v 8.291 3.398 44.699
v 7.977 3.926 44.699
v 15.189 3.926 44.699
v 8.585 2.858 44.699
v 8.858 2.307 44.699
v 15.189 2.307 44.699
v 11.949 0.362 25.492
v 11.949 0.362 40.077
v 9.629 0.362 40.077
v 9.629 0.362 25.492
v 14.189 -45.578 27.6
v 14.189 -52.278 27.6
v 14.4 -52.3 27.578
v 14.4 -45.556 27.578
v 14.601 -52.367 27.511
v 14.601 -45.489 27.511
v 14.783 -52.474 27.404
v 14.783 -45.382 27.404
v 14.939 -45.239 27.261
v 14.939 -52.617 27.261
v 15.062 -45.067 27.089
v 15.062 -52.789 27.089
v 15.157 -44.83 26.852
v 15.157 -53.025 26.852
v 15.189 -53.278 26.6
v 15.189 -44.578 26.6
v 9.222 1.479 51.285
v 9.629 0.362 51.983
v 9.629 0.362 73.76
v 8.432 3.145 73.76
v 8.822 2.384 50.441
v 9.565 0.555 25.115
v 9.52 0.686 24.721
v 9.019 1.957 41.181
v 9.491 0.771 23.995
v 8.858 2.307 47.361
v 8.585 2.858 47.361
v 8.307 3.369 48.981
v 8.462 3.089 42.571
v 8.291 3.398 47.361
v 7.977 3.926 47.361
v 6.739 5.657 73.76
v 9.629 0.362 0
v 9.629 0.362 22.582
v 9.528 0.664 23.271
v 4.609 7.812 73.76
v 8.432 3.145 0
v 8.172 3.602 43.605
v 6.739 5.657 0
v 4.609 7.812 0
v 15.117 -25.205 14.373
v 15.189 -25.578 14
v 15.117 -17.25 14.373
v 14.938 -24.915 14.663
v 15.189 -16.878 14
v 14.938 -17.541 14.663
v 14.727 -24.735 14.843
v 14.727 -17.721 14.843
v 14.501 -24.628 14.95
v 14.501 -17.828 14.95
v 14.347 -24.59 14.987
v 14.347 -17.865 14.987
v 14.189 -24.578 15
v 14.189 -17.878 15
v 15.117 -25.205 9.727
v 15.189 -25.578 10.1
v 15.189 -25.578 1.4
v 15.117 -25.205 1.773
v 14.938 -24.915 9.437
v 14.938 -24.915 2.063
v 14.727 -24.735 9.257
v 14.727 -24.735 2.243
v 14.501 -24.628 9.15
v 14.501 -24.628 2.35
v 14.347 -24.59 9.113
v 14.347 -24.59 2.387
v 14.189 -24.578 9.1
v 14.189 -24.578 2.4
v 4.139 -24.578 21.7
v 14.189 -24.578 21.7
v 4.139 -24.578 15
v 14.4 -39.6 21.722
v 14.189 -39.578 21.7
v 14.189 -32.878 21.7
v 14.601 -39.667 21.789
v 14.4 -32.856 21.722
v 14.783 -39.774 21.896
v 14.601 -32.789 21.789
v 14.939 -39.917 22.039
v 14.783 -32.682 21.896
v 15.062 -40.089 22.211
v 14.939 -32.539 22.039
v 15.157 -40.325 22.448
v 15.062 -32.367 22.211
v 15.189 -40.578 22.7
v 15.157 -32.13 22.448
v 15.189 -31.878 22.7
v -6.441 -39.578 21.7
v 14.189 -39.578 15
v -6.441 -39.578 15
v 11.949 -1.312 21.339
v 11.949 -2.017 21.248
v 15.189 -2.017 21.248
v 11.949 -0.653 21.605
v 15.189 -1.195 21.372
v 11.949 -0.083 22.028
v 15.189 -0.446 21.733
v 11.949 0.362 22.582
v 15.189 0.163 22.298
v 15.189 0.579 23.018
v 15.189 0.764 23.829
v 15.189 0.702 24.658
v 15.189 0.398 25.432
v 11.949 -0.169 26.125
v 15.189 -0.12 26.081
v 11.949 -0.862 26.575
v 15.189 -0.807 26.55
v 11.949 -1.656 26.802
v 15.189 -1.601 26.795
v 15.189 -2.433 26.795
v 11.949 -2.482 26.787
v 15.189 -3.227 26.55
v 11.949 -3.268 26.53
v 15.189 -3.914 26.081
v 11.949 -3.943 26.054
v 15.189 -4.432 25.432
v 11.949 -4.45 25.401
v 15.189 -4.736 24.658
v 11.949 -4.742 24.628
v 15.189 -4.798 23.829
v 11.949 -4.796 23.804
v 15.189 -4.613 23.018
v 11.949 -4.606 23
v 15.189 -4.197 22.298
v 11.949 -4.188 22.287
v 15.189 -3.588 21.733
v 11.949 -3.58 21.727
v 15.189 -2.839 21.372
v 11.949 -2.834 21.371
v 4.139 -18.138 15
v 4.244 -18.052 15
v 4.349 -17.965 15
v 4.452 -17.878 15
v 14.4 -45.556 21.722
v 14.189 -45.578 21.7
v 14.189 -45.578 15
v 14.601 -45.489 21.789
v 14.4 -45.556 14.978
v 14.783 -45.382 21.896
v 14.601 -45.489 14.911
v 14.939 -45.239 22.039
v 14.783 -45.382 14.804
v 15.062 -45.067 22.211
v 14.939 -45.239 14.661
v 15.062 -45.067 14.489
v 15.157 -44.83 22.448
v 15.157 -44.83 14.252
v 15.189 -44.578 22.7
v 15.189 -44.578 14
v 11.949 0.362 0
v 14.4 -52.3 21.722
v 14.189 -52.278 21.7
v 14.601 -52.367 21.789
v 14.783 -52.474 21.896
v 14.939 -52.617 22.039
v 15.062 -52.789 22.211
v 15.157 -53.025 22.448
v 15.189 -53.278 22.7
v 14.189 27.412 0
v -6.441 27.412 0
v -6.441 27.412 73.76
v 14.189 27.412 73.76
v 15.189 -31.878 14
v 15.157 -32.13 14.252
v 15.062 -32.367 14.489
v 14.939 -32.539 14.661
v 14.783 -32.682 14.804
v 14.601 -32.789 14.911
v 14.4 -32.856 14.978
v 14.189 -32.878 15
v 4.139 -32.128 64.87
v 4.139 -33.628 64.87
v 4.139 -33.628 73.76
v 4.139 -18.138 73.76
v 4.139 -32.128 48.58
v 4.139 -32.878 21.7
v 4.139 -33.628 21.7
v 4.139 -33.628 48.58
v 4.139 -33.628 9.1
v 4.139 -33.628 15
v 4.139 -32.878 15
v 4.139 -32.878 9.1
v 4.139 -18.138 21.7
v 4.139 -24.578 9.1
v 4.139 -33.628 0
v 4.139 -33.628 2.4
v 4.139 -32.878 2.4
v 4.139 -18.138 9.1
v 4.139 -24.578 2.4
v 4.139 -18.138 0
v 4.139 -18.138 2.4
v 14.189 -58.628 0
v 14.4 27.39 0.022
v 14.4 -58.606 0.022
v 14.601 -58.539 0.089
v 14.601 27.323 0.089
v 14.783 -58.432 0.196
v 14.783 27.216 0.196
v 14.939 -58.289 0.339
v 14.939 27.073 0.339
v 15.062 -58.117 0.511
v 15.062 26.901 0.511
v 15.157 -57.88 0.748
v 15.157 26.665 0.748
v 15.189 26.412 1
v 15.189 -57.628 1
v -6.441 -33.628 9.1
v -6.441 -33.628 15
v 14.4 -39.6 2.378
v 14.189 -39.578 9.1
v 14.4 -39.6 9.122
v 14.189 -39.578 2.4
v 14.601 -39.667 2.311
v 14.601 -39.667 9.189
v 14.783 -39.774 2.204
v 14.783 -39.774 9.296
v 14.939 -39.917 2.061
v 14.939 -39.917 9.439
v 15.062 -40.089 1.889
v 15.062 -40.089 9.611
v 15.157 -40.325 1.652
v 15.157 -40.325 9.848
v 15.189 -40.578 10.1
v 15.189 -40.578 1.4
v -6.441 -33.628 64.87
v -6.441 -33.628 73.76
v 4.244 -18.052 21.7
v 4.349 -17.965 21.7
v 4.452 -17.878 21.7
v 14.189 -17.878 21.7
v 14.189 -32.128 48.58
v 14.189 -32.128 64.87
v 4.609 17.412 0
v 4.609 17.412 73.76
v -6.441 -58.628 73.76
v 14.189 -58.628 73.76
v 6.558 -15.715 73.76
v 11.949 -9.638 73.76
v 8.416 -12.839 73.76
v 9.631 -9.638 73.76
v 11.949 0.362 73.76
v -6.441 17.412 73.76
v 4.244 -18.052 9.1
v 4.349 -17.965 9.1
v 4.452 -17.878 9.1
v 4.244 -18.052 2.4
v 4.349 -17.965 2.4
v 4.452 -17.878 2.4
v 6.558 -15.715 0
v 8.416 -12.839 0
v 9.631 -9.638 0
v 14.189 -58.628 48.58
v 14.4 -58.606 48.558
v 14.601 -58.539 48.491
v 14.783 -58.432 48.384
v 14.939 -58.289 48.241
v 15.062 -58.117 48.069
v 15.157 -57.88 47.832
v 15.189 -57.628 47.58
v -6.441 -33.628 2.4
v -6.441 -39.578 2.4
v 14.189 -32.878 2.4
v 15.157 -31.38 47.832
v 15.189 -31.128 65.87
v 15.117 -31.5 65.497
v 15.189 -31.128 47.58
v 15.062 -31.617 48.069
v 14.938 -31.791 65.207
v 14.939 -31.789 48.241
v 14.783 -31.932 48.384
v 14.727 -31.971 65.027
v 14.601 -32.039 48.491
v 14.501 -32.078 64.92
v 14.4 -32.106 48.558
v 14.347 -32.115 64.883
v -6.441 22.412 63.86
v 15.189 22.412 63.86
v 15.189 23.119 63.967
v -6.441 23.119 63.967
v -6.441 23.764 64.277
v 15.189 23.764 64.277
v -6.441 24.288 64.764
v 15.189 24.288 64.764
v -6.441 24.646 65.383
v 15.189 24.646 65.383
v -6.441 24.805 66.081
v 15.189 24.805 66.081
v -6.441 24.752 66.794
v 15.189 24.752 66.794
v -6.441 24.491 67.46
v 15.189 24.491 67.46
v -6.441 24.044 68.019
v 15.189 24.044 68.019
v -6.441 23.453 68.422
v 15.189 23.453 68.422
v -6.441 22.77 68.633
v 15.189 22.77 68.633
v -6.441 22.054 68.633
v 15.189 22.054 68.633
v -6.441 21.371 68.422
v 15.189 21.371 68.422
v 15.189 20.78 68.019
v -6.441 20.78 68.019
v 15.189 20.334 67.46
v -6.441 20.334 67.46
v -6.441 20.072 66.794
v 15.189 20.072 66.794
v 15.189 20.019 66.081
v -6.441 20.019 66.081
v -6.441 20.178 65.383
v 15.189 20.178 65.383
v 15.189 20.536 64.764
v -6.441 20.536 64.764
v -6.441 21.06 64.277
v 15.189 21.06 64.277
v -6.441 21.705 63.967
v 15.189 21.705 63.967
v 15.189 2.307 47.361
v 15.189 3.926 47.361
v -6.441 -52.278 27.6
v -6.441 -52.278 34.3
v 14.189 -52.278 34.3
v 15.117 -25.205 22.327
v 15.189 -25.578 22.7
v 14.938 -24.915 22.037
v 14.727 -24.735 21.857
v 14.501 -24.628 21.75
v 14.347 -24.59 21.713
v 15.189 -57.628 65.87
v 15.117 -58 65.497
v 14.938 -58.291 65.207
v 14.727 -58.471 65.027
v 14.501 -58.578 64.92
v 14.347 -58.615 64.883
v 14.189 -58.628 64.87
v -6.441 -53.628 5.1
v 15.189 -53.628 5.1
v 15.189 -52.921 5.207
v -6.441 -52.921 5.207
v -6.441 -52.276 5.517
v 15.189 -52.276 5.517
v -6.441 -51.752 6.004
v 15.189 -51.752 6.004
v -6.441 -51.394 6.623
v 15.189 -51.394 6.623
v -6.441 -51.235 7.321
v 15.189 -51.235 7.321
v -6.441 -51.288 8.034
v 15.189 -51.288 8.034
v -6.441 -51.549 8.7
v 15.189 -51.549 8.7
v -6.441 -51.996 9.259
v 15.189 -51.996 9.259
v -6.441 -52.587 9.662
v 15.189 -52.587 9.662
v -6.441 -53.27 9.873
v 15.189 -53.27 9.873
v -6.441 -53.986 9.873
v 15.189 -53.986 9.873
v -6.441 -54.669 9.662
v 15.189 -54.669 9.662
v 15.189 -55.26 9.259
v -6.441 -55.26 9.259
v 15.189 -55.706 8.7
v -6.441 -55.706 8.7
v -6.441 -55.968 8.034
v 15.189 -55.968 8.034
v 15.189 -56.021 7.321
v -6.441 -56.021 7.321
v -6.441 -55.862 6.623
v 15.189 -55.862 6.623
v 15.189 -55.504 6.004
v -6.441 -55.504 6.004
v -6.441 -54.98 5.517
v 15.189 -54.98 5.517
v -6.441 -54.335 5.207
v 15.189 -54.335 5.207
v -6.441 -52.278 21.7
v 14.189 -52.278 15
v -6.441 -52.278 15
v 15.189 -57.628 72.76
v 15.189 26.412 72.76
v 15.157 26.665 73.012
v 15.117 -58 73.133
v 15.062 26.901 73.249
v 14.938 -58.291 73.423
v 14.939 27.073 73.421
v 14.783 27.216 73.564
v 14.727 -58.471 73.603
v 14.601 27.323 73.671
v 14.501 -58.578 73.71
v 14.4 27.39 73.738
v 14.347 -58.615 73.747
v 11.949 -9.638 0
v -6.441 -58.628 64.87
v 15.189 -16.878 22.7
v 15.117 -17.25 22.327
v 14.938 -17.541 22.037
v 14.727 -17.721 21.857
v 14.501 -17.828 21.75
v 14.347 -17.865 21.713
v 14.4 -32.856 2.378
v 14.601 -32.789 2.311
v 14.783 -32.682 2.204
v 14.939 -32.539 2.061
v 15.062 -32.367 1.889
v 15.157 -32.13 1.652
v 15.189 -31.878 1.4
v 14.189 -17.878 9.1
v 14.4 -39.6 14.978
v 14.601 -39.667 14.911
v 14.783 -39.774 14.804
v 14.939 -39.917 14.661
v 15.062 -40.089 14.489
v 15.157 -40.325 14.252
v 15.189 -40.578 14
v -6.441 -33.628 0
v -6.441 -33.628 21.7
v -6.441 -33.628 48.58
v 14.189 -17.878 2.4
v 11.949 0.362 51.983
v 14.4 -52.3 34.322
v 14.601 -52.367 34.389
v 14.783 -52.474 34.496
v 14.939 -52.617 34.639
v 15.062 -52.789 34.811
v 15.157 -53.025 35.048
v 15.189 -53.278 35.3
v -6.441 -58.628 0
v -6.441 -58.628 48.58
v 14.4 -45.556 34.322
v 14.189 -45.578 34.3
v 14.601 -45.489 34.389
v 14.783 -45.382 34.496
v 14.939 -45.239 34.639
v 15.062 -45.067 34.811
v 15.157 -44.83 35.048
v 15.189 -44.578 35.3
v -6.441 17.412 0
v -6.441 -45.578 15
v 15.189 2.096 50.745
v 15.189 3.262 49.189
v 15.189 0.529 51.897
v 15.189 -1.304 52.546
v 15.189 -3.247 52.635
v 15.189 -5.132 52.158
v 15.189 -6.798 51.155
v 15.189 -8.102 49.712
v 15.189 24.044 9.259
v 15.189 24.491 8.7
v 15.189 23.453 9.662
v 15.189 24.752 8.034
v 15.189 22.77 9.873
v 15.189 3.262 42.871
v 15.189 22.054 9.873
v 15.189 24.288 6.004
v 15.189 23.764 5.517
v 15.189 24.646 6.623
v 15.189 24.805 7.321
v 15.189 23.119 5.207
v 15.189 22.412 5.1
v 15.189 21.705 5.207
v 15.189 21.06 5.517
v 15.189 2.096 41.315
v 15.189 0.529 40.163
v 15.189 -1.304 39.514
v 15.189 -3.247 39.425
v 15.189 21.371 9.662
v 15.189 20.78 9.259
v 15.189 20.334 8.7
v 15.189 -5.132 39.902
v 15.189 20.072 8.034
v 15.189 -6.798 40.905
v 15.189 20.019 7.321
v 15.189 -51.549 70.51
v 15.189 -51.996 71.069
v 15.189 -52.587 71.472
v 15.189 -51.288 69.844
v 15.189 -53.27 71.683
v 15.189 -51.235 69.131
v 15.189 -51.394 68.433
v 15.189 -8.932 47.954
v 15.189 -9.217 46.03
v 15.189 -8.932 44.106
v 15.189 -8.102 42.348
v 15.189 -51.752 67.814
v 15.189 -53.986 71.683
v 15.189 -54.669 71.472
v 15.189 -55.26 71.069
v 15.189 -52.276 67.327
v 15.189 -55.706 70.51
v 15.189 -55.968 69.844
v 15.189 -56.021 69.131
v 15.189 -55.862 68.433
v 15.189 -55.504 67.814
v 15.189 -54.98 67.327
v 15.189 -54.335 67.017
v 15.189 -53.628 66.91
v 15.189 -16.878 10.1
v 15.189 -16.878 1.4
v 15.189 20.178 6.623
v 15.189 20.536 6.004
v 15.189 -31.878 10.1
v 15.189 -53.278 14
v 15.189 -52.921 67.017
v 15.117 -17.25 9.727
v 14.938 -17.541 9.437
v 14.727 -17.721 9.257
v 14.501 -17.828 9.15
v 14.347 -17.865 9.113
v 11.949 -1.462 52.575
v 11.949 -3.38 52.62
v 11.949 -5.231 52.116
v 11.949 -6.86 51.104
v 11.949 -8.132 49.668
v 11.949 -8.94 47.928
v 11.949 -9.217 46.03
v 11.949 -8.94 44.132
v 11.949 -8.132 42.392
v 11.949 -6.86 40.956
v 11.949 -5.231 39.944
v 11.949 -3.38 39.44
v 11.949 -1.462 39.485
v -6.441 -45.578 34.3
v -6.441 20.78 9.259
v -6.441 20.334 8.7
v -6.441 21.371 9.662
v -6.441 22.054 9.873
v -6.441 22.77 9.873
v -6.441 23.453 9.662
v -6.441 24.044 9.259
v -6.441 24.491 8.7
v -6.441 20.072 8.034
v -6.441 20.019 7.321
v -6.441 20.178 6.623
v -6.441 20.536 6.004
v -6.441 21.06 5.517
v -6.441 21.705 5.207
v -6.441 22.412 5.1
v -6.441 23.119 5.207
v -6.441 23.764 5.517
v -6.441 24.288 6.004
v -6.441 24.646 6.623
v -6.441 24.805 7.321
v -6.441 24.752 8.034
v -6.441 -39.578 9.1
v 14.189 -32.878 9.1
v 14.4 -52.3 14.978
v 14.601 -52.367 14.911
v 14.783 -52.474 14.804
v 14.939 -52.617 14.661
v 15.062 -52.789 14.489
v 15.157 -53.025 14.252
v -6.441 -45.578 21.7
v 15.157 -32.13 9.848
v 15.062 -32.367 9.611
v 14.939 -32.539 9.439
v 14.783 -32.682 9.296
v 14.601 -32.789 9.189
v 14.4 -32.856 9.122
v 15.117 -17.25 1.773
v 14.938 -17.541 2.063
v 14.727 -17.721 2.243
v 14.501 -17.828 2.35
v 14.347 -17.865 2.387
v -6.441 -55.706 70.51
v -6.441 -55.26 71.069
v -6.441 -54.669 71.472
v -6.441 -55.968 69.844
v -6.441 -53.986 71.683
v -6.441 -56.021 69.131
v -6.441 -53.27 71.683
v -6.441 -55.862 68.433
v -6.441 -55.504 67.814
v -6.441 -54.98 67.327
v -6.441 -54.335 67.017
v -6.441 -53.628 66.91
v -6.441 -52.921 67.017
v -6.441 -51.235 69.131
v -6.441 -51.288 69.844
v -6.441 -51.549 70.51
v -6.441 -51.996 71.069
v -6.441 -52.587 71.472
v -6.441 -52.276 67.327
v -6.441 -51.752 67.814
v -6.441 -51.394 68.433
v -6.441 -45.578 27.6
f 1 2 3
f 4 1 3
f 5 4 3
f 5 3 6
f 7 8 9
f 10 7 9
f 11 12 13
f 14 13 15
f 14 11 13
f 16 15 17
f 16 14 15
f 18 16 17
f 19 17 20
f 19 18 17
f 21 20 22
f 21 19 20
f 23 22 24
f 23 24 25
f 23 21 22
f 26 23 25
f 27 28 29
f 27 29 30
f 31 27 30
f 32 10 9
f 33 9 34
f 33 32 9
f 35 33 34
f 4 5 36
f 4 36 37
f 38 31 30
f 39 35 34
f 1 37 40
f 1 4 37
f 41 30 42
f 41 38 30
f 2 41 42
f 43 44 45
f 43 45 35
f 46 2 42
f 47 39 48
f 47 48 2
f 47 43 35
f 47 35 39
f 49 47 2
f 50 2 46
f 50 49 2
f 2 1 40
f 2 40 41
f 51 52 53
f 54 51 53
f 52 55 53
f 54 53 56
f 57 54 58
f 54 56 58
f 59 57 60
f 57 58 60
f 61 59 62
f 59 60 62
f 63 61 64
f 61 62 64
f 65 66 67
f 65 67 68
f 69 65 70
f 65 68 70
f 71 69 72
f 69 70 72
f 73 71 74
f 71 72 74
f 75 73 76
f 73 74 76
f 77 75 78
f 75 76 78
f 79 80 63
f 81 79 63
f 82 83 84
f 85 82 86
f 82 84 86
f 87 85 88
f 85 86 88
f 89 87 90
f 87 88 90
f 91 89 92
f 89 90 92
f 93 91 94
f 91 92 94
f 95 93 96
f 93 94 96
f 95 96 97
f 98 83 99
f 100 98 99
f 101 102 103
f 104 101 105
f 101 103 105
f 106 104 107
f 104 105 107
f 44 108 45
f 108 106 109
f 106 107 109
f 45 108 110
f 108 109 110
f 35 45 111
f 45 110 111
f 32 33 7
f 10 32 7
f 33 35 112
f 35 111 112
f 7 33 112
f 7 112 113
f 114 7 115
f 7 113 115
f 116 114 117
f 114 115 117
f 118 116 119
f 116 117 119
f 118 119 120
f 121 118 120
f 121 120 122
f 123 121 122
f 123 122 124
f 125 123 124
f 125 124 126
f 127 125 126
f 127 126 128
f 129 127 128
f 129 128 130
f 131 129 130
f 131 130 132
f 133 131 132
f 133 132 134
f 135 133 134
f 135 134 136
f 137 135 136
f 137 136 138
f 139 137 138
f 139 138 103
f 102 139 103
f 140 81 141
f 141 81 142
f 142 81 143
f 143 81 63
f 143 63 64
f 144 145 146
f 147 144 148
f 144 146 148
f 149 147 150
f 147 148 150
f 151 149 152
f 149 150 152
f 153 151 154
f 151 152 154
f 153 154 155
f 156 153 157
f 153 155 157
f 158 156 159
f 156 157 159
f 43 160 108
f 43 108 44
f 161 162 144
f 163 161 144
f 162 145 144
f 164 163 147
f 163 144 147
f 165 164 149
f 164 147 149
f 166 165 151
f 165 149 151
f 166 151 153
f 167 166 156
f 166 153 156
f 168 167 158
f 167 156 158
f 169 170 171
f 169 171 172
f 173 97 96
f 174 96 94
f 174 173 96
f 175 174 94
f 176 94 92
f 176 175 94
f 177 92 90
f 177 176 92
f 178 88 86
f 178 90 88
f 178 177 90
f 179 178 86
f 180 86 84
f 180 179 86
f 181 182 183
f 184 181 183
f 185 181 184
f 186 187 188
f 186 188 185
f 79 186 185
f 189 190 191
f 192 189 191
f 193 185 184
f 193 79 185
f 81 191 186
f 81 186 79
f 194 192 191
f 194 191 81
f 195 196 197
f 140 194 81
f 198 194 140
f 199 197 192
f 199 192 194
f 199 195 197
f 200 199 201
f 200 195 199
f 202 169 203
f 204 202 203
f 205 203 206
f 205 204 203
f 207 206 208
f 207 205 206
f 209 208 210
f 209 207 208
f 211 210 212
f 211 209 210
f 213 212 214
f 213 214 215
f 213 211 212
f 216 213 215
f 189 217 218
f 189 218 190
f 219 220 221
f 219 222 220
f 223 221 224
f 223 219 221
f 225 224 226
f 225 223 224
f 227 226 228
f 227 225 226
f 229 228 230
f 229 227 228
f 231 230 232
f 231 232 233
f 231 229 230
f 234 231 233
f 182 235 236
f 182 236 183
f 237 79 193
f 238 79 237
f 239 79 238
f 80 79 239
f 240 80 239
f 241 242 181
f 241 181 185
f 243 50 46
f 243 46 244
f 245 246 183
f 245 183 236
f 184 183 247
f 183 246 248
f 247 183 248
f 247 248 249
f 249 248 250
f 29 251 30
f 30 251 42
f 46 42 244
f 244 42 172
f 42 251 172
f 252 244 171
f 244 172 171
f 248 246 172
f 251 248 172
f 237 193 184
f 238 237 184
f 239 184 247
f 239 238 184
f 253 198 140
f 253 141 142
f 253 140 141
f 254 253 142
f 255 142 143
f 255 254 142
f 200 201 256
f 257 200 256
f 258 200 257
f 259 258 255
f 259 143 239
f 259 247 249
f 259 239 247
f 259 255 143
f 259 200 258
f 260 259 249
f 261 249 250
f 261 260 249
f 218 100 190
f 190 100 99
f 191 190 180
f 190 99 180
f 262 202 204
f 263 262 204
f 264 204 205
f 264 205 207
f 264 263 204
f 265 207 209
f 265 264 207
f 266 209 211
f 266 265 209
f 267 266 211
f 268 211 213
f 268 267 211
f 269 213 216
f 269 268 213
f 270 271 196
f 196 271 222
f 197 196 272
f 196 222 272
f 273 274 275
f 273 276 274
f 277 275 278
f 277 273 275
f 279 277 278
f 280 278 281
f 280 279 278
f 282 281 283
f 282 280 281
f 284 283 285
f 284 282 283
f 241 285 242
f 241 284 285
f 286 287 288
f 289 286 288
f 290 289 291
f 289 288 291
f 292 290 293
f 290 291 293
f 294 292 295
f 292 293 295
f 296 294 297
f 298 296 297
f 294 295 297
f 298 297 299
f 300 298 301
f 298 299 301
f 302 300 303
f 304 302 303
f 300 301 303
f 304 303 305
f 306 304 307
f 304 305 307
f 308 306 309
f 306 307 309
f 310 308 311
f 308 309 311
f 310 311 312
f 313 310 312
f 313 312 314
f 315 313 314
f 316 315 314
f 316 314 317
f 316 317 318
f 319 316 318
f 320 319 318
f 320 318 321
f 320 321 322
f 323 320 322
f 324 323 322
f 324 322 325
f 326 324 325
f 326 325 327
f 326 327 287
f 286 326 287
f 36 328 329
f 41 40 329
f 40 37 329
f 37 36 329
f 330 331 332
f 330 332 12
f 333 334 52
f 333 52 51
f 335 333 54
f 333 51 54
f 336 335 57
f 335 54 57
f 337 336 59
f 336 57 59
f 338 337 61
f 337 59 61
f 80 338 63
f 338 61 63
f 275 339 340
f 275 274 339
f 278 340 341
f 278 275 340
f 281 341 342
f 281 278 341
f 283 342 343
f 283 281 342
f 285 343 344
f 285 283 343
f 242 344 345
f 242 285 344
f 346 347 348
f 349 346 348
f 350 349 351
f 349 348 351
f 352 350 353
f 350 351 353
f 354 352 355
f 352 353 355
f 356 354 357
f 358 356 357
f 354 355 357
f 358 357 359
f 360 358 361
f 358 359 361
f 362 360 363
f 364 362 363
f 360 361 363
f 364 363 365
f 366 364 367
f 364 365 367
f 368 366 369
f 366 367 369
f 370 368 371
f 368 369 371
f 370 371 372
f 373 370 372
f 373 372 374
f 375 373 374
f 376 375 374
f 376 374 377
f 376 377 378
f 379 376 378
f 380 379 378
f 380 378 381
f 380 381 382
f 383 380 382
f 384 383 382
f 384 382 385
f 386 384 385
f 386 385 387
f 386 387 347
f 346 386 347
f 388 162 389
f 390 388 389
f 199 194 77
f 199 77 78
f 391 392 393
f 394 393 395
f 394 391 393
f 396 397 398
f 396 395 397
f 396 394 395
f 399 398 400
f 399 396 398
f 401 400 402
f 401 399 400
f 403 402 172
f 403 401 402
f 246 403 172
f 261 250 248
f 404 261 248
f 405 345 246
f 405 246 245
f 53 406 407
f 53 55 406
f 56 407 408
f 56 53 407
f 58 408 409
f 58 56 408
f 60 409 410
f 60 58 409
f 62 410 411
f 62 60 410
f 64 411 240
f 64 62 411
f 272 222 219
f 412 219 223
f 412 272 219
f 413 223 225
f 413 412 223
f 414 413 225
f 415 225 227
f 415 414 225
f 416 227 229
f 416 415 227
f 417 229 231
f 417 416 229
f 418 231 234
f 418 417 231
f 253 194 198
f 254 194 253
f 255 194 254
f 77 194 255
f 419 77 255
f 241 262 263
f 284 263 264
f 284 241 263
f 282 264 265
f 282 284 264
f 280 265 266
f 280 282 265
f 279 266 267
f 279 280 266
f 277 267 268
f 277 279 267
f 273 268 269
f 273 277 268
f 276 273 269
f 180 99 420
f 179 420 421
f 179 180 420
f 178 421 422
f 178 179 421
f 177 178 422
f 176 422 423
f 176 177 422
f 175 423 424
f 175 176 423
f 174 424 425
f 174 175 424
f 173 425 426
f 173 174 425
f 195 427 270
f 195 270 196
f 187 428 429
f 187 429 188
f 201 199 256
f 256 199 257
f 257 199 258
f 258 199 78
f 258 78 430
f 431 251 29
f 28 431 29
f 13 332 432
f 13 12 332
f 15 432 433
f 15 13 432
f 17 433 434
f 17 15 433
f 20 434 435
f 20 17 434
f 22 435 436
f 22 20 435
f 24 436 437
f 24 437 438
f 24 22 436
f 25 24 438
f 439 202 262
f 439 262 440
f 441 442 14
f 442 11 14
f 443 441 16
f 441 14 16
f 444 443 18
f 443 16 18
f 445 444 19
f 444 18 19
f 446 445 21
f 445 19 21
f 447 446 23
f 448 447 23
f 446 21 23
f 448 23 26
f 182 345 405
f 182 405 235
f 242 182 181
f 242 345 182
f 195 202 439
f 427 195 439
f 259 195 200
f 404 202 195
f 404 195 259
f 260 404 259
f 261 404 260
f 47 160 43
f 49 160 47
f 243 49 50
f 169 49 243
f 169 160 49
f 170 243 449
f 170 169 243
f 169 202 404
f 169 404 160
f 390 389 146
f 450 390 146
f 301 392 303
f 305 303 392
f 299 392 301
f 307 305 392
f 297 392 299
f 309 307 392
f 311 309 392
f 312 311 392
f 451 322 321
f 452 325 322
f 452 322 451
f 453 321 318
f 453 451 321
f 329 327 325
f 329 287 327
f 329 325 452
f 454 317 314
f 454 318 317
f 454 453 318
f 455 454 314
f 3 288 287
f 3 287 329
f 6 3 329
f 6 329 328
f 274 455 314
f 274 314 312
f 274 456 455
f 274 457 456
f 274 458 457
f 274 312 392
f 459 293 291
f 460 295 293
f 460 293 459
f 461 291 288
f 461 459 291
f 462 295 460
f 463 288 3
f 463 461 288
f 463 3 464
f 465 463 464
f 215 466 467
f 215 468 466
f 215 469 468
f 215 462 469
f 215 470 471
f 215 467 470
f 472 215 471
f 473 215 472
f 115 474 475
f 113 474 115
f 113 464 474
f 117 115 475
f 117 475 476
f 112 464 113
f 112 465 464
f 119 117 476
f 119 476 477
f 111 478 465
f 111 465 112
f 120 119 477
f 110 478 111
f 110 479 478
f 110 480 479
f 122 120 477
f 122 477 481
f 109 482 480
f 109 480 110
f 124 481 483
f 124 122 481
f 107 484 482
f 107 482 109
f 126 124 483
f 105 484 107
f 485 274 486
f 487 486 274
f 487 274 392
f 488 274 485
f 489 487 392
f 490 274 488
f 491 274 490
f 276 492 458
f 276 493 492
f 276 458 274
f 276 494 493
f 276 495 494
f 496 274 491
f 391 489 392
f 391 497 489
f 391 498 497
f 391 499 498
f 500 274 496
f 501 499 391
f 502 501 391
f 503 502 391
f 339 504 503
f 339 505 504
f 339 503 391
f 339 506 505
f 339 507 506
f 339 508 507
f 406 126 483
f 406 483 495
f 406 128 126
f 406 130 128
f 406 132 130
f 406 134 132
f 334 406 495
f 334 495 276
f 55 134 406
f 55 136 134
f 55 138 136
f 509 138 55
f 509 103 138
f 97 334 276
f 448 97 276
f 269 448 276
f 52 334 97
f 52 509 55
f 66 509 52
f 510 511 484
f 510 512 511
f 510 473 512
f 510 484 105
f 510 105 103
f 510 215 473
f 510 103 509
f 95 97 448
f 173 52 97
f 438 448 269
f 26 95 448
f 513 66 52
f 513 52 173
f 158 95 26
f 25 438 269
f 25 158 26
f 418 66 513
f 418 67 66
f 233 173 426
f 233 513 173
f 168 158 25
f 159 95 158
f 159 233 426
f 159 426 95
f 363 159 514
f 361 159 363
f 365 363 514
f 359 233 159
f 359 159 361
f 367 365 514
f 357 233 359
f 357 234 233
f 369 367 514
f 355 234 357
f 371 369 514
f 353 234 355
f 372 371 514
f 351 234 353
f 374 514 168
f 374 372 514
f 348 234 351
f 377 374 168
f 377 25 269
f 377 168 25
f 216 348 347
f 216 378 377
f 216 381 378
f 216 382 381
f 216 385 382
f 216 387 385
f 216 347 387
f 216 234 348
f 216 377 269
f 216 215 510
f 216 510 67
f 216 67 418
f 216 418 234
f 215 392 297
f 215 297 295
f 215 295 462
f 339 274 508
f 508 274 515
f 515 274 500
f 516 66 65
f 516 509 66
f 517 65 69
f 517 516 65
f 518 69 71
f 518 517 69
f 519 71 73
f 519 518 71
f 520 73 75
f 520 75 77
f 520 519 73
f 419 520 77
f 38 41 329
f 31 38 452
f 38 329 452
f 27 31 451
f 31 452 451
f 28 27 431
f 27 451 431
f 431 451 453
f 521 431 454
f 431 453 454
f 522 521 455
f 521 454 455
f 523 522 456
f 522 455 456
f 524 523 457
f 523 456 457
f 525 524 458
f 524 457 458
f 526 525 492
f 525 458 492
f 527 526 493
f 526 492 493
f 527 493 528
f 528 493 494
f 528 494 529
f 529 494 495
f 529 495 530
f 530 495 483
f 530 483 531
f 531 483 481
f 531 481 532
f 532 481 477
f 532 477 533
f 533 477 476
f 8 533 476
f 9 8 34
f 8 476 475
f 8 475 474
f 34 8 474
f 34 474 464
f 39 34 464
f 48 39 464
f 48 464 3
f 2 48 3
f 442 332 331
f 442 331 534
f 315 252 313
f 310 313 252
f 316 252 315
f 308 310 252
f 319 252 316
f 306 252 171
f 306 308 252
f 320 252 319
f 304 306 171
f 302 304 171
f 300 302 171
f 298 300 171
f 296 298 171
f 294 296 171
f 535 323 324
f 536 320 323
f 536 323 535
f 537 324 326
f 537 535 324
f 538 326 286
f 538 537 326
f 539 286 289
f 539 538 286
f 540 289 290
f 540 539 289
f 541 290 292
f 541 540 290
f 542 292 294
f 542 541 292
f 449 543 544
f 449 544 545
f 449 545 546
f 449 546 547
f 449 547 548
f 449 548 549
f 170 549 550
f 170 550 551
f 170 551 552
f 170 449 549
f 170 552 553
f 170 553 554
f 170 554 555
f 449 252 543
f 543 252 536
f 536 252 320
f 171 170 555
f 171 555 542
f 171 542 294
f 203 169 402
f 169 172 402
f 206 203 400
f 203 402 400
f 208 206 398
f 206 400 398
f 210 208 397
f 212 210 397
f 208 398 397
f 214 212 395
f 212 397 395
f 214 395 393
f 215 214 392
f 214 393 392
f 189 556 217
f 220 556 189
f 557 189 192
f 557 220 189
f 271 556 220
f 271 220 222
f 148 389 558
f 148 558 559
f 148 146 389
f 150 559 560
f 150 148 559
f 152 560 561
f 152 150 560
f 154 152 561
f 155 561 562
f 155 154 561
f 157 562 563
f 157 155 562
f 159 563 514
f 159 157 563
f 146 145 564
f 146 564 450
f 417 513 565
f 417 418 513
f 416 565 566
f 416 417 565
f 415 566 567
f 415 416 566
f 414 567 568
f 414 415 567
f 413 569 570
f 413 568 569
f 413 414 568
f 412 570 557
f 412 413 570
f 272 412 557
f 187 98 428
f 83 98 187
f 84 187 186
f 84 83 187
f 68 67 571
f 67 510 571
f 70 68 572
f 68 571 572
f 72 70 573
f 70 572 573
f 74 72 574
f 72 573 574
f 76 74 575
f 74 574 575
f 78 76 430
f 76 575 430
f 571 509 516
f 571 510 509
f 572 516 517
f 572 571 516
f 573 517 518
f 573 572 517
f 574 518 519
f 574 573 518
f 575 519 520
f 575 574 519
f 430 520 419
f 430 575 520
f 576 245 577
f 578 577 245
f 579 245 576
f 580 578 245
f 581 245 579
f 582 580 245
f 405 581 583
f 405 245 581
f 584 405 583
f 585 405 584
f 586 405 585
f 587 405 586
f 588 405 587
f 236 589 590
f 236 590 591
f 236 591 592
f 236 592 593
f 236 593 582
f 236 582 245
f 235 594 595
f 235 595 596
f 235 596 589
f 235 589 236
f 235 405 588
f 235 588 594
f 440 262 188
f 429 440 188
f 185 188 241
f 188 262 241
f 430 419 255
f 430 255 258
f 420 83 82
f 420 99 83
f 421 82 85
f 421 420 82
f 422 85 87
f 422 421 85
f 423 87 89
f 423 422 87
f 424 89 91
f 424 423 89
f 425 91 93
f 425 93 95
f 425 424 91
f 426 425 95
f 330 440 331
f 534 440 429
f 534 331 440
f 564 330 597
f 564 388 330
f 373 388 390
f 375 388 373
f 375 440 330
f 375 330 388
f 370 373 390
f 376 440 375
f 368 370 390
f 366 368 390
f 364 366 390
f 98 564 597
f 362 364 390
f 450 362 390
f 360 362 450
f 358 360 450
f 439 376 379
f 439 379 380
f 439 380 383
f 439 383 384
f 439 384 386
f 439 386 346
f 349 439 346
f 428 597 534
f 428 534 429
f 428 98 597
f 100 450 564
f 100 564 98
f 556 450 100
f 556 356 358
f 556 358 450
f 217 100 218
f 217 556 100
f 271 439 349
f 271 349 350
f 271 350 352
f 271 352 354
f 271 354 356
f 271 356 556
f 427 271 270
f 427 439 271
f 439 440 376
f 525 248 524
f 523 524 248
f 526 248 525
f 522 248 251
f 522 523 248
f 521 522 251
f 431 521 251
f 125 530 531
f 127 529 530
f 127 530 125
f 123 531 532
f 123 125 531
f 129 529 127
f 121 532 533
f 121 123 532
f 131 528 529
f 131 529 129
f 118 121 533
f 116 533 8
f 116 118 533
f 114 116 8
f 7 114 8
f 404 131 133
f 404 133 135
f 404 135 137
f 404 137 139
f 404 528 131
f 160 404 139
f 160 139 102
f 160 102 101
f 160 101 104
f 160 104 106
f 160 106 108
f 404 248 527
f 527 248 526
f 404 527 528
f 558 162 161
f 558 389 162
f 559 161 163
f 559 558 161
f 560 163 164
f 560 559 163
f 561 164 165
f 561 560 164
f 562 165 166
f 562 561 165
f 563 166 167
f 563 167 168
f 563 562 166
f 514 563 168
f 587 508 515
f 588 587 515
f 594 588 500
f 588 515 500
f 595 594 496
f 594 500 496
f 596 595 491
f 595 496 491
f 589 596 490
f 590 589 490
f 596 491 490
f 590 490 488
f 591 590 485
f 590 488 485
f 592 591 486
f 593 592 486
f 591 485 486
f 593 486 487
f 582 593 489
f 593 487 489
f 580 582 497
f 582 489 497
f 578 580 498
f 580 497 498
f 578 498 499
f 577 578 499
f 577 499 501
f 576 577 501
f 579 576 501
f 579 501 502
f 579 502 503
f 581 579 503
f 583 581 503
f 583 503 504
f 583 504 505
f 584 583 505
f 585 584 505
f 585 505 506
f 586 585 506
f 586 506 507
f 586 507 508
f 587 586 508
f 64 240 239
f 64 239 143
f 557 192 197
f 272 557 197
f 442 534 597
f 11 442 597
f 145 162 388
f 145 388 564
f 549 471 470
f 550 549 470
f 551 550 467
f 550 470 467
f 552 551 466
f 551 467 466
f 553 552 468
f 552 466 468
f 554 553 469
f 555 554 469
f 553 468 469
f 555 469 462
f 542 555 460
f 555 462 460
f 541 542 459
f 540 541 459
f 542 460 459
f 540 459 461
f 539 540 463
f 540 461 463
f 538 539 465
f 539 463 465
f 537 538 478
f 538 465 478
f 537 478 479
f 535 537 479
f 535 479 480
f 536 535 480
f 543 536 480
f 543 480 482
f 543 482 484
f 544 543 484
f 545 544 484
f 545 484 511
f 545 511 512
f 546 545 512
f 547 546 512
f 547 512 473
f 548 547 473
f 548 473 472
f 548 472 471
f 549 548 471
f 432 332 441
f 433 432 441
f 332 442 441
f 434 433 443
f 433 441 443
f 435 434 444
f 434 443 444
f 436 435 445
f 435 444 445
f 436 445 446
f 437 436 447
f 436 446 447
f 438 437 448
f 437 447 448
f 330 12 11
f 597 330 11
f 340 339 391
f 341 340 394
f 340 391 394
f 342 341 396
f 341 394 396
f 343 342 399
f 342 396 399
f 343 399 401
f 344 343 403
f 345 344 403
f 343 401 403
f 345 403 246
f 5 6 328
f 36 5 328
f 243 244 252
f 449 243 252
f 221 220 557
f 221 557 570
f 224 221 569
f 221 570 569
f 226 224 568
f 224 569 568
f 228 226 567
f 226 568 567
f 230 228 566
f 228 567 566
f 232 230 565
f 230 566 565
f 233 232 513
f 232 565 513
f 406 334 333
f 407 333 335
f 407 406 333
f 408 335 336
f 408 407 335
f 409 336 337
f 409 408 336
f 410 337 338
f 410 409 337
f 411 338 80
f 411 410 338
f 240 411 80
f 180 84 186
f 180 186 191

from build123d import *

# Parameters (mm, degrees)
PROFILEEXTRUDE_DEPTH = 73.76
HOSEWINDOW_W         = 16.29
HOSEWINDOW_H         = 26.5
HOSEWINDOWCUT_DEPTH  = 22.63
CAGESCREWS_R         = 2.4
CAGESCREWSCUT_DEPTH  = 22.63
AXLEHOLECUT_DEPTH    = 22.63
SETSCREWS_R          = 2.426338021
SETSCREWS_R_2        = 2.788762315
SETSCREWSCUT_DEPTH   = 22.63
SKETCH1_W            = 6.7
SKETCH1_H            = 6.7
CUT_EXTRUDE1_DEPTH   = 22.63
FILLET1_R            = 1


with BuildPart() as part:
    # Profile → ProfileExtrude (new body)
    with BuildSketch(Plane.XY):
        with BuildLine():
            Line((-6.44073477, -58.62791746), (-6.44073477, -33.62791746))
            Line((-6.44073477, -33.62791746), (4.13926523, -33.62791746))
            Line((4.13926523, -33.62791746), (4.13926523, -18.13791746))
            ThreePointArc((4.13926523, -18.13791746), (7.563334043, -14.326029686), (9.63126523, -9.63791746))
            Line((9.63126523, -9.63791746), (11.94926523, -9.63791746))
            Line((11.94926523, -9.63791746), (11.94926523, 0.36208254))
            Line((11.94926523, 0.36208254), (9.62926523, 0.36208254))
            ThreePointArc((9.62926523, 0.36208254), (7.643946533, 4.440626184), (4.60926523, 7.81208254))
            Line((4.60926523, 7.81208254), (4.60926523, 17.41208254))
            Line((4.60926523, 17.41208254), (-6.44073477, 17.41208254))
            Line((-6.44073477, 17.41208254), (-6.44073477, 27.41208254))
            Line((-6.44073477, 27.41208254), (15.18926523, 27.41208254))
            Line((15.18926523, 27.41208254), (15.18926523, -58.62791746))
            Line((15.18926523, -58.62791746), (-6.44073477, -58.62791746))
        make_face()
    extrude(amount=PROFILEEXTRUDE_DEPTH)

    # HoseWindow → HoseWindowCut (cut, through all)
    with BuildSketch(Plane(origin=(15.18926523, 0, 0), x_dir=(0, 0, -1), z_dir=(1, 0, 0))):
        with Locations((-56.725, -45.37791746)):
            Rectangle(HOSEWINDOW_W, HOSEWINDOW_H)
    extrude(amount=-HOSEWINDOWCUT_DEPTH, mode=Mode.SUBTRACT)

    # CageScrews → CageScrewsCut (cut, through all)
    with BuildSketch(Plane(origin=(15.18926523, 0, 0), x_dir=(0, 0, -1), z_dir=(1, 0, 0))):
        with Locations((-66.26, 22.41208254)):
            Circle(CAGESCREWS_R)
        with Locations((-7.5, 22.41208254)):
            Circle(CAGESCREWS_R)
        with Locations((-7.5, -53.62791746)):
            Circle(CAGESCREWS_R)
        with Locations((-69.31, -53.62791746)):
            Circle(CAGESCREWS_R)
    extrude(amount=-CAGESCREWSCUT_DEPTH, mode=Mode.SUBTRACT)

    # AxleHole → AxleHoleCut (cut, through all)
    with BuildSketch(Plane(origin=(15.18926523, 0, 0), x_dir=(0, 0, -1), z_dir=(1, 0, 0))):
        with BuildLine():
            Line((-44.699, 2.307293484), (-47.361, 2.307293484))
            Line((-47.361, 2.307293484), (-47.361, 3.926293484))
            ThreePointArc((-47.361, 3.926293484), (-46.03, -9.21691746), (-44.699, 3.926293484))
            Line((-44.699, 3.926293484), (-44.699, 2.307293484))
        make_face()
    extrude(amount=-AXLEHOLECUT_DEPTH, mode=Mode.SUBTRACT)

    # SetScrews → SetScrewsCut (cut, through all)
    with BuildSketch(Plane(origin=(15.18926523, 0, 0), x_dir=(0, 0, -1), z_dir=(1, 0, 0))):
        with Locations((-85.624962528, 3.100017238)):
            Circle(SETSCREWS_R)
        with Locations((-24.037149362, -2.017095907)):
            Circle(SETSCREWS_R_2)
    extrude(amount=-SETSCREWSCUT_DEPTH, mode=Mode.SUBTRACT)

    # Sketch1 → Cut-Extrude1 (cut, through all)
    with BuildSketch(Plane(origin=(15.18926523, 0, 0), x_dir=(0, 0, -1), z_dir=(1, 0, 0))):
        with Locations((-18.35, -48.92791746)):
            Rectangle(SKETCH1_W, SKETCH1_H)
        with Locations((-30.95, -48.92791746)):
            Rectangle(SKETCH1_W, SKETCH1_H)
        with Locations((-5.75, -36.22791746)):
            Rectangle(SKETCH1_W, SKETCH1_H)
        with Locations((-18.35, -36.22791746)):
            Rectangle(SKETCH1_W, SKETCH1_H)
        with Locations((-5.75, -21.22791746)):
            Rectangle(SKETCH1_W, SKETCH1_H)
        with Locations((-18.35, -21.22791746)):
            Rectangle(SKETCH1_W, SKETCH1_H)
    extrude(amount=-CUT_EXTRUDE1_DEPTH, mode=Mode.SUBTRACT)

    # Fillet1
    fillet1_edges = [part.edges().sort_by_distance(p)[0] for p in [
        (15.18926523, -45.57791746, 18.35),
        (15.18926523, -48.92791746, 21.7),
        (15.18926523, -52.27791746, 18.35),
        (15.18926523, -48.92791746, 15),
        (15.18926523, -48.92791746, 34.3),
        (15.18926523, -52.27791746, 30.95),
        (15.18926523, -48.92791746, 27.6),
        (15.18926523, -45.57791746, 30.95),
        (15.18926523, -36.22791746, 9.1),
        (15.18926523, -39.57791746, 5.75),
        (15.18926523, -36.22791746, 2.4),
        (15.18926523, -32.87791746, 5.75),
        (15.18926523, -36.22791746, 21.7),
        (15.18926523, -39.57791746, 18.35),
        (15.18926523, -36.22791746, 15),
        (15.18926523, -32.87791746, 18.35),
        (15.18926523, -15.60791746, 0),
        (15.18926523, -21.22791746, 9.1),
        (15.18926523, -24.57791746, 5.75),
        (15.18926523, -21.22791746, 2.4),
        (15.18926523, -17.87791746, 5.75),
        (15.18926523, -21.22791746, 21.7),
        (15.18926523, -24.57791746, 18.35),
        (15.18926523, -21.22791746, 15),
        (15.18926523, -17.87791746, 18.35),
        (15.18926523, -58.62791746, 69.315),
        (15.18926523, 27.41208254, 36.88),
        (15.18926523, -58.62791746, 24.29),
        (15.18926523, -15.60791746, 73.76),
        (15.18926523, -45.37791746, 64.87),
        (15.18926523, -45.37791746, 48.58),
        (15.18926523, -32.12791746, 56.725),
    ]]
    fillet(fillet1_edges, radius=FILLET1_R)


solid = part.part
